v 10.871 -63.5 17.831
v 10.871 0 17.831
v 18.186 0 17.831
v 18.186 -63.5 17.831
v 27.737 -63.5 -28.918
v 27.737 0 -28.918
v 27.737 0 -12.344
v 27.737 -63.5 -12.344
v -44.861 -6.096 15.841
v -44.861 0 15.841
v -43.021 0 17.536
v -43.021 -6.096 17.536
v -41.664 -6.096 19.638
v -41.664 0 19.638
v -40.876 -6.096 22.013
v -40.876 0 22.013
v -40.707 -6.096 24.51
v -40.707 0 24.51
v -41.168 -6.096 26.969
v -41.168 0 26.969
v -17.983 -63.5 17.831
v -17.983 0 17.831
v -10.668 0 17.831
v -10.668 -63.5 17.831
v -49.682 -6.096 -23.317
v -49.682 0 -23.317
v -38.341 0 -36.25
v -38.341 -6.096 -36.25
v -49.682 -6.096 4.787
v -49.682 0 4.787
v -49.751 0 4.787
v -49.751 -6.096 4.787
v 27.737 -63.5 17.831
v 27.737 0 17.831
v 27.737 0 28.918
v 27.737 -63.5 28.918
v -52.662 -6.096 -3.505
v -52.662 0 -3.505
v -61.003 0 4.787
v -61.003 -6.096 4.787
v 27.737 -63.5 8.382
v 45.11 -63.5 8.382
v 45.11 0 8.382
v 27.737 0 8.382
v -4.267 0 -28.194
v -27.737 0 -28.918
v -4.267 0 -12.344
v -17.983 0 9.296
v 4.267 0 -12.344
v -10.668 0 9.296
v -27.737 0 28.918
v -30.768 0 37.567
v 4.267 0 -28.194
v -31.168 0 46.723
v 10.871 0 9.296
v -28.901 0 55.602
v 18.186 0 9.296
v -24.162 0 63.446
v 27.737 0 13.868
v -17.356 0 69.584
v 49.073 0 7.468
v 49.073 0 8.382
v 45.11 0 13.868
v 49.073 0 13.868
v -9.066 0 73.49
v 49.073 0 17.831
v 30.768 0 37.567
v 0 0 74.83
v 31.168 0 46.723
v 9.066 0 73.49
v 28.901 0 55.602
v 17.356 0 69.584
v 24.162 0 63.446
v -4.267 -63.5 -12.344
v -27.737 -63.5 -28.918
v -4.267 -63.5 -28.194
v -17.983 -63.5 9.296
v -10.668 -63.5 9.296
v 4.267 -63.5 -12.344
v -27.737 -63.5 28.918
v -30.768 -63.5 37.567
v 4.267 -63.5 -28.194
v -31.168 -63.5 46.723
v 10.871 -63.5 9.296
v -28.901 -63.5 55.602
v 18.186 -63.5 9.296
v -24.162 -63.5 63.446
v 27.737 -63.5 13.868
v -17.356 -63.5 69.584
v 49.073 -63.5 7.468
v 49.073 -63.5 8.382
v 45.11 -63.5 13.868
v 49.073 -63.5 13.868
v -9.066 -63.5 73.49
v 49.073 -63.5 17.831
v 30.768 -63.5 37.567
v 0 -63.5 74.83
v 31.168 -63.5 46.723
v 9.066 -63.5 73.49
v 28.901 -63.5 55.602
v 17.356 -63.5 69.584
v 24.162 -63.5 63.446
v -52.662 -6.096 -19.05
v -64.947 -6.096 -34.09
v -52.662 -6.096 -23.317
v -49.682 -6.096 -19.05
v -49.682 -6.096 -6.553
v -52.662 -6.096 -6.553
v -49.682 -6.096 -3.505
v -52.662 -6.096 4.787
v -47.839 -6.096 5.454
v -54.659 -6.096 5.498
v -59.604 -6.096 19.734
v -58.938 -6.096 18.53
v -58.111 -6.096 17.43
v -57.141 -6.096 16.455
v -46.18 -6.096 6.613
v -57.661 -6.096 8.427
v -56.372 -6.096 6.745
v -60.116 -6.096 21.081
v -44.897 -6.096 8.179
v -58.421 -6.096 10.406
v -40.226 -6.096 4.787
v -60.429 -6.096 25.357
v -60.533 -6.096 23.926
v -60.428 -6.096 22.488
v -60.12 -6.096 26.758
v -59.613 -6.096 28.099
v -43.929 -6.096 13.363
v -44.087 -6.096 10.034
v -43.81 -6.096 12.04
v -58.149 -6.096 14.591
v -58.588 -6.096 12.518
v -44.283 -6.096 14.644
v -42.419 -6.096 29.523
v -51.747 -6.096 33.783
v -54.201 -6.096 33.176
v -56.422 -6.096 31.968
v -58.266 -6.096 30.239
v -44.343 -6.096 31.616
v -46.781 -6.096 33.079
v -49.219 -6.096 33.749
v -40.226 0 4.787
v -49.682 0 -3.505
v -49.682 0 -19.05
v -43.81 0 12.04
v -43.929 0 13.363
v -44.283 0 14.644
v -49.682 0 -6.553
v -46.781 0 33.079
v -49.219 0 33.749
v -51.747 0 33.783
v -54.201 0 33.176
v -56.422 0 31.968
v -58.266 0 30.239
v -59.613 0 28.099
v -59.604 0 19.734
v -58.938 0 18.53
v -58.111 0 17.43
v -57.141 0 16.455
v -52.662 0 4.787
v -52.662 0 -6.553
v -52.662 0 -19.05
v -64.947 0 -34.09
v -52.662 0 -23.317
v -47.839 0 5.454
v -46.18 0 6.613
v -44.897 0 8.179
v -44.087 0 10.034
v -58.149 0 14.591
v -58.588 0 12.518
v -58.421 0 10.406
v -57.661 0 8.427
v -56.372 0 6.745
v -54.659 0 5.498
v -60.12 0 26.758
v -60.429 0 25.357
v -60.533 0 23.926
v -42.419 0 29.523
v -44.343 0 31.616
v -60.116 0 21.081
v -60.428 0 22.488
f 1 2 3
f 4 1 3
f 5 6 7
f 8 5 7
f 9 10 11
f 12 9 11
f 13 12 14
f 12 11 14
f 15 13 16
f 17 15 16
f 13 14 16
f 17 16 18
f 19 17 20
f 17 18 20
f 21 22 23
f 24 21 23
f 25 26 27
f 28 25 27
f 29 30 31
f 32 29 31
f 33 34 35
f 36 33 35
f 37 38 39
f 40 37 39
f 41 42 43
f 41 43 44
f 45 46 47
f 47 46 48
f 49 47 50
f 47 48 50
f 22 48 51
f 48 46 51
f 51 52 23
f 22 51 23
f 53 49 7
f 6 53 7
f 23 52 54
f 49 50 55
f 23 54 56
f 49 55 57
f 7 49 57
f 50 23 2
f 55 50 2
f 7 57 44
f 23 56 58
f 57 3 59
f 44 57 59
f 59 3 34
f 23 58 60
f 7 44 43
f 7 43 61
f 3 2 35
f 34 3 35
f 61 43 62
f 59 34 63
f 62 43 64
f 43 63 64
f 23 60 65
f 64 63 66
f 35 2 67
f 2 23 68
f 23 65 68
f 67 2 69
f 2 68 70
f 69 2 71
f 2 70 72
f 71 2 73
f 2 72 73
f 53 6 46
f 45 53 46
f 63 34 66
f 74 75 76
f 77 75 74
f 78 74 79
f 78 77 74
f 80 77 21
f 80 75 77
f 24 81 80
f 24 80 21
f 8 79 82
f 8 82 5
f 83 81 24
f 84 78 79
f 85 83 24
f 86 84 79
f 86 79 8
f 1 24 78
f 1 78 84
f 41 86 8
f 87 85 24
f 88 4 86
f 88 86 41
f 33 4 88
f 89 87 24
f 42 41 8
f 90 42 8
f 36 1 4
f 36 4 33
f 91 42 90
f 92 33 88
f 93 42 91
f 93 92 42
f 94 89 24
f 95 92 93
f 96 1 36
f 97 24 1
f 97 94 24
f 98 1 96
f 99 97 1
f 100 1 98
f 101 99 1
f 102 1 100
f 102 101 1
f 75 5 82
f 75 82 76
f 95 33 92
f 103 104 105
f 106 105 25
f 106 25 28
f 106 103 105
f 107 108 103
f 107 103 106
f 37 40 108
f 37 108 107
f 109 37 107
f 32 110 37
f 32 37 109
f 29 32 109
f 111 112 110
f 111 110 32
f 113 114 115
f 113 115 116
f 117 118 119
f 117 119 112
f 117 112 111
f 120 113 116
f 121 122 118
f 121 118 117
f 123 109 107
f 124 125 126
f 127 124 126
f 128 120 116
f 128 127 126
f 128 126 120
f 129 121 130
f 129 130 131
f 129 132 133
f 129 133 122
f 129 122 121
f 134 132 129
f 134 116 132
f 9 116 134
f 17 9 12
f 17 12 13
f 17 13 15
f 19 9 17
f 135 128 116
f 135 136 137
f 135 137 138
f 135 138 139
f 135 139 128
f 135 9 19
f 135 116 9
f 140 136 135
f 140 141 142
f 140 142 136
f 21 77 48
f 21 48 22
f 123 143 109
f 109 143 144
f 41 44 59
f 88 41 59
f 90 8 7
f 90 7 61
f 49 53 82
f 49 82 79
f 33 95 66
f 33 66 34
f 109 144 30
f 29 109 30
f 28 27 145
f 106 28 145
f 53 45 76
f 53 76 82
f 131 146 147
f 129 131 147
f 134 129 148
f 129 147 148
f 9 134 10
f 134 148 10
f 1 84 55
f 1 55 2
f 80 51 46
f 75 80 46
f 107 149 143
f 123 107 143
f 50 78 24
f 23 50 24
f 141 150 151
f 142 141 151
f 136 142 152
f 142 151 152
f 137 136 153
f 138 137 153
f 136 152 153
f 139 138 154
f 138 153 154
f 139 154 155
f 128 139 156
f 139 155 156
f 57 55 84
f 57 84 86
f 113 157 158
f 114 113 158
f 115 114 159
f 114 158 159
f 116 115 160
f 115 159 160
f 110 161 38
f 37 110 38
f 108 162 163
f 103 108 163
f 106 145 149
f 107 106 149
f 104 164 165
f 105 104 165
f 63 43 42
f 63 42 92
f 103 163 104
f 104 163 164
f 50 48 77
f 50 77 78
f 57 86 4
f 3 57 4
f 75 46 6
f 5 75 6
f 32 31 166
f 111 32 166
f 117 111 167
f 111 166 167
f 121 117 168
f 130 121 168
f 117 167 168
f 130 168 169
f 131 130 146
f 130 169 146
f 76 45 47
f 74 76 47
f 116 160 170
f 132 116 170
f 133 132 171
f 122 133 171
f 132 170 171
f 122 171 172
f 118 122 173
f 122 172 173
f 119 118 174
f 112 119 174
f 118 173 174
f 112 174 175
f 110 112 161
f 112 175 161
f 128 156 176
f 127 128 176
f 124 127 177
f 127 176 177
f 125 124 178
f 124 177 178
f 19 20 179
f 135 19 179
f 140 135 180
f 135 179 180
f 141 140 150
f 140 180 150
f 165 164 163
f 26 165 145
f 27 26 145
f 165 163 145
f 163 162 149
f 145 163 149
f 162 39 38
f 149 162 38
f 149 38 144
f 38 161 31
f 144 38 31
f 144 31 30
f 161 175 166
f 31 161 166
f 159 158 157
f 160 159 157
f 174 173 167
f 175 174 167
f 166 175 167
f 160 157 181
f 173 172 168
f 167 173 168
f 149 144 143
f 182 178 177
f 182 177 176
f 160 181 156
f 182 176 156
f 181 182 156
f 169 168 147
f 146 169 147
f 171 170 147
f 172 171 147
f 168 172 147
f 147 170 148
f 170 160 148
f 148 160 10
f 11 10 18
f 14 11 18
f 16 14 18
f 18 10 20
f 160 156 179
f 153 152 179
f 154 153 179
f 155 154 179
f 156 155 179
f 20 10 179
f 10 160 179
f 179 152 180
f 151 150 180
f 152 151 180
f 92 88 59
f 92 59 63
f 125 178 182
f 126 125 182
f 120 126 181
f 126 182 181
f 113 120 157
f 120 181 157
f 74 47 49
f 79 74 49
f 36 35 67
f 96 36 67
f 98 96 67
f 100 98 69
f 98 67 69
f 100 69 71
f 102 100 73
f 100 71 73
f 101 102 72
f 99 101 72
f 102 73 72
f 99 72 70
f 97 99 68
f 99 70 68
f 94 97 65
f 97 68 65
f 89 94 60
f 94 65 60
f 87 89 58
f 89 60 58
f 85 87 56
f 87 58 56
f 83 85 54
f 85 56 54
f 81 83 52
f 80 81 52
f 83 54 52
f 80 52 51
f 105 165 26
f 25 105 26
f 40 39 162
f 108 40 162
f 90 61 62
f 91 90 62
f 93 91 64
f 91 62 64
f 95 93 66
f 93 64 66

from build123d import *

# Parameters (mm, degrees)
F0_W     = 8.5344025865
F0_H     = 15.8495996147
F0_W_2   = 7.3151998222
F0_H_2   = 8.5343997926
F0_W_3   = 3.9624013007
F0_H_3   = 5.4863998666
F1_DEPTH = 63.5
F3_DEPTH = 6.096


with BuildPart() as f1:
    # F0 (on Front) → F1 (new body)
    with BuildSketch(Plane.XZ):
        Polygon((-27.7367997915, -28.918268159), (27.7367997915, -28.918268159), (27.7367997915, -12.3444003984), (27.7367997915, 8.3820000291), (27.7367997915, 13.8683998957), (27.7367997915, 17.8308002651), (27.7367997915, 28.918268159), (-27.7367997915, 28.918268159), align=None)
        with Locations((0, -20.2692002058)):
            Rectangle(F0_W, F0_H, mode=Mode.SUBTRACT)
        with Locations((-14.3256001174, 13.5636003688)):
            Rectangle(F0_W_2, F0_H_2, mode=Mode.SUBTRACT)
        with Locations((14.5287988707, 13.5636003688)):
            Rectangle(F0_W_2, F0_H_2, mode=Mode.SUBTRACT)
        Polygon((27.7367997915, 8.3820000291), (27.7367997915, -12.3444003984), (49.0728020668, 7.4676000513), (49.0728020668, 8.3820000291), (45.1104007661, 8.3820000291), (38.4048009291, 8.3820000291), (31.6991992295, 8.3820000291), align=None)
        with BuildLine():
            ThreePointArc((27.7367997915, 28.918268159), (0, 74.8298837074), (-27.7367997915, 28.918268159))
            Line((-27.7367997915, 28.918268159), (27.7367997915, 28.918268159))
        make_face()
        Polygon((27.7367997915, 17.8308002651), (27.7367997915, 13.8683998957), (31.6991992295, 13.8683998957), (38.4048009291, 13.8683998957), (45.1104007661, 13.8683998957), (49.0728020668, 13.8683998957), (49.0728020668, 17.8308002651), align=None)
        with Locations((47.0916014165, 11.1251999624)):
            Rectangle(F0_W_3, F0_H_3)
    extrude(amount=F1_DEPTH)


with BuildPart() as f3:
    # F2 (on Front) → F3 (new body)
    with BuildSketch(Plane.XZ):
        with BuildLine():
            ThreePointArc((-49.7505084084, 4.7874413024), (-45.4844049053, 7.3521477549), (-43.8095466134, 12.0395999402))
            ThreePointArc((-43.8095466134, 12.0395999402), (-44.0772117106, 14.0114299761), (-44.8608353551, 15.8405533395))
            Line((-44.8608353551, 15.8405533395), (-57.1406206075, 16.4553028988))
            ThreePointArc((-57.1406206075, 16.4553028988), (-58.112062238, 9.3890842408), (-52.6622891022, 4.7874413024))
            Line((-52.6622891022, 4.7874413024), (-49.7505084084, 4.7874413024))
        make_face()
        with BuildLine():
            Line((-57.1406206075, 16.4553028988), (-44.8608353551, 15.8405533395))
            ThreePointArc((-44.8608353551, 15.8405533395), (-46.7307388097, 17.9287331243), (-49.2433622803, 19.1712133206))
            ThreePointArc((-49.2433622803, 19.1712133206), (-53.6119383371, 19.034369481), (-57.1406206075, 16.4553028988))
        make_face()
        with BuildLine():
            ThreePointArc((-49.2433622803, 19.1712133206), (-46.7307388097, 17.9287331243), (-44.8608353551, 15.8405533395))
            ThreePointArc((-44.8608353551, 15.8405533395), (-41.1945518698, 20.800943518), (-41.1678089703, 26.9691191101))
            Line((-41.1678089703, 26.9691191101), (-59.603898109, 19.7336010308))
            ThreePointArc((-59.603898109, 19.7336010308), (-58.5434696845, 17.9658063908), (-57.1406206075, 16.4553028988))
            ThreePointArc((-57.1406206075, 16.4553028988), (-53.6119383371, 19.034369481), (-49.2433622803, 19.1712133206))
        make_face()
        with BuildLine():
            Line((-49.6824011207, 4.7874413024), (-49.7505084084, 4.7874413024))
            ThreePointArc((-49.7505084084, 4.7874413024), (-51.2063987553, 4.6427477983), (-52.6622891022, 4.7874413024))
            Line((-52.6622891022, 4.7874413024), (-52.6622891022, -3.5052001476))
            Line((-52.6622891022, -3.5052001476), (-52.6622891022, -6.5532000735))
            Line((-52.6622891022, -6.5532000735), (-52.6622891022, -19.0500002354))
            Line((-52.6622891022, -19.0500002354), (-52.6622891022, -23.3171992004))
            Line((-52.6622891022, -23.3171992004), (-49.6824011207, -23.3171992004))
            Line((-49.6824011207, -23.3171992004), (-49.6824011207, -19.0500002354))
            Line((-49.6824011207, -19.0500002354), (-49.6824011207, -6.5532000735))
            Line((-49.6824011207, -6.5532000735), (-49.6824011207, -3.5052001476))
            Line((-49.6824011207, -3.5052001476), (-49.6824011207, 4.7874413024))
        make_face()
        with BuildLine():
            ThreePointArc((-52.6622891022, 4.7874413024), (-51.2063987553, 4.6427477983), (-49.7505084084, 4.7874413024))
            Line((-49.7505084084, 4.7874413024), (-52.6622891022, 4.7874413024))
        make_face()
        with BuildLine():
            Line((-59.603898109, 19.7336010308), (-41.1678089703, 26.9691191101))
            ThreePointArc((-41.1678089703, 26.9691191101), (-42.0310103091, 28.907815409), (-43.2867587174, 30.61859179))
            Line((-43.2867587174, 30.61859179), (-60.5331154133, 23.9259169849))
            ThreePointArc((-60.5331154133, 23.9259169849), (-60.2980259457, 21.7788866021), (-59.603898109, 19.7336010308))
        make_face()
        with BuildLine():
            Line((-60.5331154133, 23.9259169849), (-43.2867587174, 30.61859179))
            ThreePointArc((-43.2867587174, 30.61859179), (-44.9000278759, 32.039012776), (-46.7813509421, 33.0786553472))
            Line((-46.7813509421, 33.0786553472), (-59.6127105669, 28.0992780334))
            ThreePointArc((-59.6127105669, 28.0992780334), (-60.3002822656, 26.0627421721), (-60.5331154133, 23.9259169849))
        make_face()
        Polygon((-52.6622891022, -6.5532000735), (-52.6622891022, -3.5052001476), (-61.0028546961, 4.7874413024), align=None)
        Polygon((-40.2257950144, 4.7874413024), (-49.6824011207, -3.5052001476), (-49.6824011207, -6.5532000735), align=None)
        with BuildLine():
            Line((-59.6127105669, 28.0992780334), (-46.7813509421, 33.0786553472))
            ThreePointArc((-46.7813509421, 33.0786553472), (-54.2008191091, 33.1756293497), (-59.6127105669, 28.0992780334))
        make_face()
        Polygon((-52.6622891022, -23.3171992004), (-52.6622891022, -19.0500002354), (-64.9474813362, -34.0902707651), align=None)
        Polygon((-38.3410298295, -36.2504583617), (-49.6824011207, -19.0500002354), (-49.6824011207, -23.3171992004), align=None)
    extrude(amount=F3_DEPTH)


solid = Compound([f1.part, f3.part])
